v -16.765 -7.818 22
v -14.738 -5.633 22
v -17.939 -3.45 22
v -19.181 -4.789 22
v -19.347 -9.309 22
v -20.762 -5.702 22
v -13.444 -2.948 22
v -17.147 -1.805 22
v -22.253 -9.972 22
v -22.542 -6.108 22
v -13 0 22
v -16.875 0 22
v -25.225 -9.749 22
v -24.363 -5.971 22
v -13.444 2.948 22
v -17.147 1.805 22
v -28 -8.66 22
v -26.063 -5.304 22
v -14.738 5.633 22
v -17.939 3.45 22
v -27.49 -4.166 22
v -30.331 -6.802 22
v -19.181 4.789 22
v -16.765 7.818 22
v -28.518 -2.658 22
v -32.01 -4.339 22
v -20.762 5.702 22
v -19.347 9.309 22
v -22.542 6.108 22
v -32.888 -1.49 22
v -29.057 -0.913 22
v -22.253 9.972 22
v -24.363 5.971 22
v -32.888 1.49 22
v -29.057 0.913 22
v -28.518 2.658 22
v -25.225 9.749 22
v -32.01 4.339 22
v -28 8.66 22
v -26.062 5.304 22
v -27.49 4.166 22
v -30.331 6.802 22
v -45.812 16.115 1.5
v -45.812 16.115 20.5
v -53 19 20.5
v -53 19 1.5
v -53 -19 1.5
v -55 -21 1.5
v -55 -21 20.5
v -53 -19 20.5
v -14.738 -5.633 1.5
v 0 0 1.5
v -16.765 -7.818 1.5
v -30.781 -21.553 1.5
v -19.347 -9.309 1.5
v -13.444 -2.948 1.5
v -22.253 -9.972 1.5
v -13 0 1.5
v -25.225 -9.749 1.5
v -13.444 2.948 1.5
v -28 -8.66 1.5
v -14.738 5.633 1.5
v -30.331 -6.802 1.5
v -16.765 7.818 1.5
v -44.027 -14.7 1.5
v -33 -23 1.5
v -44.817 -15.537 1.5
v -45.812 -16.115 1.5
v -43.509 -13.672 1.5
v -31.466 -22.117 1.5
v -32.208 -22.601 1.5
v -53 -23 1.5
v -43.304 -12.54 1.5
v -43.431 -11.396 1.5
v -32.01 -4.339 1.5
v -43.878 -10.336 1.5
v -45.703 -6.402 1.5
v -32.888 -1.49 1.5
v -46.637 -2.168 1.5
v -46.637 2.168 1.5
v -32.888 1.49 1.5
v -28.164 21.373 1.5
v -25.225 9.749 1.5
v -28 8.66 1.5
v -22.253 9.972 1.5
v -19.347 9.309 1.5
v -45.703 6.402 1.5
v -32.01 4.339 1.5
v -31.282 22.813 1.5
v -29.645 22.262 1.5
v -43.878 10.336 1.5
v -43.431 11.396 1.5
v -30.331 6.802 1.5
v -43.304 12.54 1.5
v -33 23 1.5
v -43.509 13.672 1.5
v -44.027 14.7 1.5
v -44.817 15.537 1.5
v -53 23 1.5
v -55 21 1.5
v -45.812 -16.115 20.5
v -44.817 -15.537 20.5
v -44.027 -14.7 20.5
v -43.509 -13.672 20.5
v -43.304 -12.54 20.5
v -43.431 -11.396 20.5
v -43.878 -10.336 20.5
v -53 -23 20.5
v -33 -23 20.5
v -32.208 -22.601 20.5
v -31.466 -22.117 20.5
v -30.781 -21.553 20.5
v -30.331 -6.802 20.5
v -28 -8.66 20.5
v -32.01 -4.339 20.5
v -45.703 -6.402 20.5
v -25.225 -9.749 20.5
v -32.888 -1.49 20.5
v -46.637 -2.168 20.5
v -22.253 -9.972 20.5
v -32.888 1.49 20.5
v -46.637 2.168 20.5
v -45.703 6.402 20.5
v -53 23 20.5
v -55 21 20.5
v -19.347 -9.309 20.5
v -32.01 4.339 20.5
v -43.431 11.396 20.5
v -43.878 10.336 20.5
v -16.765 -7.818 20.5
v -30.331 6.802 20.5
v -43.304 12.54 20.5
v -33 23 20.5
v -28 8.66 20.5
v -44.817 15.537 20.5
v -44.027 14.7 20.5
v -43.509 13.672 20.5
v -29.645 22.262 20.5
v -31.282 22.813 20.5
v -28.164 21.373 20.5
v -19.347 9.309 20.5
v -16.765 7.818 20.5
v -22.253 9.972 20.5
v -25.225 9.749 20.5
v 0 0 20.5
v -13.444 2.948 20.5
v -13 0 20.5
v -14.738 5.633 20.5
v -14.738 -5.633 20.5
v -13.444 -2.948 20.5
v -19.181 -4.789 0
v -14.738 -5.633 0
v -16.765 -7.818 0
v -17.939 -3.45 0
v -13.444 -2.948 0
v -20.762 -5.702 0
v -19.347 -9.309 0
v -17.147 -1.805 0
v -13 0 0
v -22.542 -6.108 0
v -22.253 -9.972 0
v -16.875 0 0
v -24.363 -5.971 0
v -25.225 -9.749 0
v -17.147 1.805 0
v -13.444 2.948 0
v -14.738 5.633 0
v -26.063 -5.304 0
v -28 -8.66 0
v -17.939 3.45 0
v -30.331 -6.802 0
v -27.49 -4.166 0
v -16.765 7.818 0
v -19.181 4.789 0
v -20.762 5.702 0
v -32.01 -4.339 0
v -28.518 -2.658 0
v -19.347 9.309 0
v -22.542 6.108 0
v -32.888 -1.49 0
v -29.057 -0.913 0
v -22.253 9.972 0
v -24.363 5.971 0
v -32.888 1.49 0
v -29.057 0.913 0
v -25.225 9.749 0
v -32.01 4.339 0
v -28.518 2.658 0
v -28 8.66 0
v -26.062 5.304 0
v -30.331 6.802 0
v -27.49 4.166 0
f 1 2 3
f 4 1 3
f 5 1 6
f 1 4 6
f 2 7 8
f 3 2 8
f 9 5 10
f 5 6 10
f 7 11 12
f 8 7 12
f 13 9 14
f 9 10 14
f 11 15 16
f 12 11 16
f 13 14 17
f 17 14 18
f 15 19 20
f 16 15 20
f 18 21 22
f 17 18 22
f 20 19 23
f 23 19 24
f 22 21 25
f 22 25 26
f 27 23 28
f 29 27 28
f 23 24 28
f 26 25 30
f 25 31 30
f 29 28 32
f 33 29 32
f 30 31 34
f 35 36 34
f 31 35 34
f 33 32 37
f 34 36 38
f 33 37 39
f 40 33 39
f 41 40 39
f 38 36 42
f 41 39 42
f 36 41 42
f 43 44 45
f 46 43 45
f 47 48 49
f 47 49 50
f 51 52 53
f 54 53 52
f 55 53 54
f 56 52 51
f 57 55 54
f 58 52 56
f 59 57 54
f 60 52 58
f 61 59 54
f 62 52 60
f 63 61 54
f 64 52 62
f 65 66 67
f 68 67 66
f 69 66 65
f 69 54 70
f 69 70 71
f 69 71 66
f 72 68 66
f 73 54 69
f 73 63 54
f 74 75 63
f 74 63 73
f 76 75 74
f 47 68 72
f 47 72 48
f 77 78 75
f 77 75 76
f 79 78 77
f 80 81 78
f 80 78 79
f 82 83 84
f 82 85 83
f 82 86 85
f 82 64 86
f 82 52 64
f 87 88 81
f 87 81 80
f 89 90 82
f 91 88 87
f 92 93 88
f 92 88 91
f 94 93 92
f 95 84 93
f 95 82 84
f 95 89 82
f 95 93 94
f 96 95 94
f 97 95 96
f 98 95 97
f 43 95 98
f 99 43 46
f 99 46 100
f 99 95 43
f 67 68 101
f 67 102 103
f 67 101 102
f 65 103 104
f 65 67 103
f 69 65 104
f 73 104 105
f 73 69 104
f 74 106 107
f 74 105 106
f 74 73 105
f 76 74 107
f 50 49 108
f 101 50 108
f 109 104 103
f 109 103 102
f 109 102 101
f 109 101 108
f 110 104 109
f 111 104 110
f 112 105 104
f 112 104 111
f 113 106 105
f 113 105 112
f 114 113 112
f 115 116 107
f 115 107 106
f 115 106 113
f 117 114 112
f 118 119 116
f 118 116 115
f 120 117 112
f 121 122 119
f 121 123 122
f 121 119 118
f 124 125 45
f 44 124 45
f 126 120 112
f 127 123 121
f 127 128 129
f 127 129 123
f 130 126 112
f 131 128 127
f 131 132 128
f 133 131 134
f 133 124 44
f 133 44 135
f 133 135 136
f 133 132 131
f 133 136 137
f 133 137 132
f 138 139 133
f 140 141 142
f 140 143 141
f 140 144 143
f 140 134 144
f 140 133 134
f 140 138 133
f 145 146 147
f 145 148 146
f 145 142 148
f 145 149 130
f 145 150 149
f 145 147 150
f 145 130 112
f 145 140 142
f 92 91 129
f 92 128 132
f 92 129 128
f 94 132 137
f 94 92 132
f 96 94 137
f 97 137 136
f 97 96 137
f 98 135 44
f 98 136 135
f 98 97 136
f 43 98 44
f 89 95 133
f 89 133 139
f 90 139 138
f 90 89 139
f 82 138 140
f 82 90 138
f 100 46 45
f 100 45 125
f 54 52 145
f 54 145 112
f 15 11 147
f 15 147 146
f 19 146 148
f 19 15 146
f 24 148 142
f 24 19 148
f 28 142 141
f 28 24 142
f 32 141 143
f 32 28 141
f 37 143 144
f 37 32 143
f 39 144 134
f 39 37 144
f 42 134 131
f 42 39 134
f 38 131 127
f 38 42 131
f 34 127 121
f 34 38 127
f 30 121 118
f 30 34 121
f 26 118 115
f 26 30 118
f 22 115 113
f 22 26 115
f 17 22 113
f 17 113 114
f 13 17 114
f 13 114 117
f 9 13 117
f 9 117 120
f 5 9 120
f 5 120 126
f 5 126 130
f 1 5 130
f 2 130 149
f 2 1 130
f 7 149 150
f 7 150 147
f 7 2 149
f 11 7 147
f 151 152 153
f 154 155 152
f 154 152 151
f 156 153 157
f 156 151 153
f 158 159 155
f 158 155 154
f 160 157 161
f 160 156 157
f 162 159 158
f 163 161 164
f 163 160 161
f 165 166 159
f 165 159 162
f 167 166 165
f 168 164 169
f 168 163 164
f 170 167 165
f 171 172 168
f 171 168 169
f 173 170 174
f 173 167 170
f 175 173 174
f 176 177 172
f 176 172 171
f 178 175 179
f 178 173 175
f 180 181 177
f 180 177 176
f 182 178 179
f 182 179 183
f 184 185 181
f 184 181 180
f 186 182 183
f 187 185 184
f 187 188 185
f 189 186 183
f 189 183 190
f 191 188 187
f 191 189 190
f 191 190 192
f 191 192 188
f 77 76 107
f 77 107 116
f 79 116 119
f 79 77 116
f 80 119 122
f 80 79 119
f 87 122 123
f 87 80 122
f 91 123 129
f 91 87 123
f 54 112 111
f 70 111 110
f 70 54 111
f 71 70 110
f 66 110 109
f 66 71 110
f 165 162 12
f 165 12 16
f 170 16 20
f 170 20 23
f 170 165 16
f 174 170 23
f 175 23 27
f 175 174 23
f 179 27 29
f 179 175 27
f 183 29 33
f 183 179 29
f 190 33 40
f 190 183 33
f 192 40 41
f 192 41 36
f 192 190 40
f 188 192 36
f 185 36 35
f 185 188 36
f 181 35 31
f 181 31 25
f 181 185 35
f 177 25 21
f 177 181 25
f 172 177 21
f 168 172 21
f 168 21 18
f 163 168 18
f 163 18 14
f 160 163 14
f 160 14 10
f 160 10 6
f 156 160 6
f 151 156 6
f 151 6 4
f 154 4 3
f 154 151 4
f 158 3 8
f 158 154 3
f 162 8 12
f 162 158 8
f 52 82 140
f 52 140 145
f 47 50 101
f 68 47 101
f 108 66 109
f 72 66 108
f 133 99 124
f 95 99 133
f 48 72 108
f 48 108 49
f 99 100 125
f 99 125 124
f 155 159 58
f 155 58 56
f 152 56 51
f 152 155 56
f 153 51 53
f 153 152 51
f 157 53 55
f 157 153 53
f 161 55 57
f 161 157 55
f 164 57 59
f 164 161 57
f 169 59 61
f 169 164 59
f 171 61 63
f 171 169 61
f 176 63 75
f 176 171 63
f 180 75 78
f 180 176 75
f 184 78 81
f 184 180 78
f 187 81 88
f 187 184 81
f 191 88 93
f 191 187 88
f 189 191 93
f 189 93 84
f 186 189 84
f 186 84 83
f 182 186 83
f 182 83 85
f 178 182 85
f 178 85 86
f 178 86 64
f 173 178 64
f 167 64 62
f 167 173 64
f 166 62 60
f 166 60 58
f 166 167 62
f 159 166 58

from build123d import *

# Parameters (mm, degrees)
ESBO_O1_R                = 6.125
RESSALTO_EXTRUS_O1_DEPTH = 22
ESBO_O2_OUTSIDE_W        = 72
ESBO_O2_OUTSIDE_H        = 63
ESBO_O2_OUTSIDE_R        = 10
CORTE_EXTRUS_O1_DEPTH    = 1.5
ESBO_O3_OUTSIDE_W        = 72
ESBO_O3_OUTSIDE_H        = 63
ESBO_O3_OUTSIDE_R        = 10
CORTE_EXTRUS_O2_DEPTH    = 1.5


with BuildPart() as part:
    # Esboço1 → Ressalto-extrusão1 (new body)
    with BuildSketch(Plane.XY):
        with BuildLine():
            ThreePointArc((-30.781182975, -21.553216354), (-31.830295908, -22.369078713), (-33, -23))
            Line((-33, -23), (-53, -23))
            Line((-53, -23), (-55, -21))
            Line((-55, -21), (-53, -19))
            Line((-53, -19), (-45.812043902, -16.114839283))
            ThreePointArc((-45.812043902, -16.114839283), (-43.50890364, -13.67237999), (-43.877574187, -10.335593438))
            ThreePointArc((-43.877574187, -10.335593438), (-46.755205534, 0), (-43.877574187, 10.335593438))
            ThreePointArc((-43.877574187, 10.335593438), (-43.50890364, 13.67237999), (-45.812043902, 16.114839283))
            Line((-45.812043902, 16.114839283), (-53, 19))
            Line((-53, 19), (-55, 21))
            Line((-55, 21), (-53, 23))
            Line((-53, 23), (-33, 23))
            ThreePointArc((-33, 23), (-30.448735361, 22.582285193), (-28.163895976, 21.372762185))
            Line((-28.163895976, 21.372762185), (0, 0))
            Line((0, 0), (-30.781182975, -21.553216354))
        make_face()
        with Locations((-23, 0)):
            Circle(ESBO_O1_R, mode=Mode.SUBTRACT)
    extrude(amount=RESSALTO_EXTRUS_O1_DEPTH)

    # Esboço2 outside → Corte-extrusão1 (cut)
    with BuildSketch(Plane.XY.offset(22)):
        with Locations((-27.5, 0)):
            Rectangle(ESBO_O2_OUTSIDE_W, ESBO_O2_OUTSIDE_H)
        with Locations((-23, 0)):
            Circle(ESBO_O2_OUTSIDE_R, mode=Mode.SUBTRACT)
    extrude(amount=-CORTE_EXTRUS_O1_DEPTH, mode=Mode.SUBTRACT)

    # Esboço3 outside → Corte-extrusão2 (cut)
    with BuildSketch(Plane(origin=(0, 0, 0), x_dir=(-1, 0, 0), z_dir=(0, 0, -1))):
        with Locations((27.5, 0)):
            Rectangle(ESBO_O3_OUTSIDE_W, ESBO_O3_OUTSIDE_H)
        with Locations(Location((23, 0, 0), (0, 0, 180))):
            Circle(ESBO_O3_OUTSIDE_R, mode=Mode.SUBTRACT)
    extrude(amount=-CORTE_EXTRUS_O2_DEPTH, mode=Mode.SUBTRACT)


solid = part.part
